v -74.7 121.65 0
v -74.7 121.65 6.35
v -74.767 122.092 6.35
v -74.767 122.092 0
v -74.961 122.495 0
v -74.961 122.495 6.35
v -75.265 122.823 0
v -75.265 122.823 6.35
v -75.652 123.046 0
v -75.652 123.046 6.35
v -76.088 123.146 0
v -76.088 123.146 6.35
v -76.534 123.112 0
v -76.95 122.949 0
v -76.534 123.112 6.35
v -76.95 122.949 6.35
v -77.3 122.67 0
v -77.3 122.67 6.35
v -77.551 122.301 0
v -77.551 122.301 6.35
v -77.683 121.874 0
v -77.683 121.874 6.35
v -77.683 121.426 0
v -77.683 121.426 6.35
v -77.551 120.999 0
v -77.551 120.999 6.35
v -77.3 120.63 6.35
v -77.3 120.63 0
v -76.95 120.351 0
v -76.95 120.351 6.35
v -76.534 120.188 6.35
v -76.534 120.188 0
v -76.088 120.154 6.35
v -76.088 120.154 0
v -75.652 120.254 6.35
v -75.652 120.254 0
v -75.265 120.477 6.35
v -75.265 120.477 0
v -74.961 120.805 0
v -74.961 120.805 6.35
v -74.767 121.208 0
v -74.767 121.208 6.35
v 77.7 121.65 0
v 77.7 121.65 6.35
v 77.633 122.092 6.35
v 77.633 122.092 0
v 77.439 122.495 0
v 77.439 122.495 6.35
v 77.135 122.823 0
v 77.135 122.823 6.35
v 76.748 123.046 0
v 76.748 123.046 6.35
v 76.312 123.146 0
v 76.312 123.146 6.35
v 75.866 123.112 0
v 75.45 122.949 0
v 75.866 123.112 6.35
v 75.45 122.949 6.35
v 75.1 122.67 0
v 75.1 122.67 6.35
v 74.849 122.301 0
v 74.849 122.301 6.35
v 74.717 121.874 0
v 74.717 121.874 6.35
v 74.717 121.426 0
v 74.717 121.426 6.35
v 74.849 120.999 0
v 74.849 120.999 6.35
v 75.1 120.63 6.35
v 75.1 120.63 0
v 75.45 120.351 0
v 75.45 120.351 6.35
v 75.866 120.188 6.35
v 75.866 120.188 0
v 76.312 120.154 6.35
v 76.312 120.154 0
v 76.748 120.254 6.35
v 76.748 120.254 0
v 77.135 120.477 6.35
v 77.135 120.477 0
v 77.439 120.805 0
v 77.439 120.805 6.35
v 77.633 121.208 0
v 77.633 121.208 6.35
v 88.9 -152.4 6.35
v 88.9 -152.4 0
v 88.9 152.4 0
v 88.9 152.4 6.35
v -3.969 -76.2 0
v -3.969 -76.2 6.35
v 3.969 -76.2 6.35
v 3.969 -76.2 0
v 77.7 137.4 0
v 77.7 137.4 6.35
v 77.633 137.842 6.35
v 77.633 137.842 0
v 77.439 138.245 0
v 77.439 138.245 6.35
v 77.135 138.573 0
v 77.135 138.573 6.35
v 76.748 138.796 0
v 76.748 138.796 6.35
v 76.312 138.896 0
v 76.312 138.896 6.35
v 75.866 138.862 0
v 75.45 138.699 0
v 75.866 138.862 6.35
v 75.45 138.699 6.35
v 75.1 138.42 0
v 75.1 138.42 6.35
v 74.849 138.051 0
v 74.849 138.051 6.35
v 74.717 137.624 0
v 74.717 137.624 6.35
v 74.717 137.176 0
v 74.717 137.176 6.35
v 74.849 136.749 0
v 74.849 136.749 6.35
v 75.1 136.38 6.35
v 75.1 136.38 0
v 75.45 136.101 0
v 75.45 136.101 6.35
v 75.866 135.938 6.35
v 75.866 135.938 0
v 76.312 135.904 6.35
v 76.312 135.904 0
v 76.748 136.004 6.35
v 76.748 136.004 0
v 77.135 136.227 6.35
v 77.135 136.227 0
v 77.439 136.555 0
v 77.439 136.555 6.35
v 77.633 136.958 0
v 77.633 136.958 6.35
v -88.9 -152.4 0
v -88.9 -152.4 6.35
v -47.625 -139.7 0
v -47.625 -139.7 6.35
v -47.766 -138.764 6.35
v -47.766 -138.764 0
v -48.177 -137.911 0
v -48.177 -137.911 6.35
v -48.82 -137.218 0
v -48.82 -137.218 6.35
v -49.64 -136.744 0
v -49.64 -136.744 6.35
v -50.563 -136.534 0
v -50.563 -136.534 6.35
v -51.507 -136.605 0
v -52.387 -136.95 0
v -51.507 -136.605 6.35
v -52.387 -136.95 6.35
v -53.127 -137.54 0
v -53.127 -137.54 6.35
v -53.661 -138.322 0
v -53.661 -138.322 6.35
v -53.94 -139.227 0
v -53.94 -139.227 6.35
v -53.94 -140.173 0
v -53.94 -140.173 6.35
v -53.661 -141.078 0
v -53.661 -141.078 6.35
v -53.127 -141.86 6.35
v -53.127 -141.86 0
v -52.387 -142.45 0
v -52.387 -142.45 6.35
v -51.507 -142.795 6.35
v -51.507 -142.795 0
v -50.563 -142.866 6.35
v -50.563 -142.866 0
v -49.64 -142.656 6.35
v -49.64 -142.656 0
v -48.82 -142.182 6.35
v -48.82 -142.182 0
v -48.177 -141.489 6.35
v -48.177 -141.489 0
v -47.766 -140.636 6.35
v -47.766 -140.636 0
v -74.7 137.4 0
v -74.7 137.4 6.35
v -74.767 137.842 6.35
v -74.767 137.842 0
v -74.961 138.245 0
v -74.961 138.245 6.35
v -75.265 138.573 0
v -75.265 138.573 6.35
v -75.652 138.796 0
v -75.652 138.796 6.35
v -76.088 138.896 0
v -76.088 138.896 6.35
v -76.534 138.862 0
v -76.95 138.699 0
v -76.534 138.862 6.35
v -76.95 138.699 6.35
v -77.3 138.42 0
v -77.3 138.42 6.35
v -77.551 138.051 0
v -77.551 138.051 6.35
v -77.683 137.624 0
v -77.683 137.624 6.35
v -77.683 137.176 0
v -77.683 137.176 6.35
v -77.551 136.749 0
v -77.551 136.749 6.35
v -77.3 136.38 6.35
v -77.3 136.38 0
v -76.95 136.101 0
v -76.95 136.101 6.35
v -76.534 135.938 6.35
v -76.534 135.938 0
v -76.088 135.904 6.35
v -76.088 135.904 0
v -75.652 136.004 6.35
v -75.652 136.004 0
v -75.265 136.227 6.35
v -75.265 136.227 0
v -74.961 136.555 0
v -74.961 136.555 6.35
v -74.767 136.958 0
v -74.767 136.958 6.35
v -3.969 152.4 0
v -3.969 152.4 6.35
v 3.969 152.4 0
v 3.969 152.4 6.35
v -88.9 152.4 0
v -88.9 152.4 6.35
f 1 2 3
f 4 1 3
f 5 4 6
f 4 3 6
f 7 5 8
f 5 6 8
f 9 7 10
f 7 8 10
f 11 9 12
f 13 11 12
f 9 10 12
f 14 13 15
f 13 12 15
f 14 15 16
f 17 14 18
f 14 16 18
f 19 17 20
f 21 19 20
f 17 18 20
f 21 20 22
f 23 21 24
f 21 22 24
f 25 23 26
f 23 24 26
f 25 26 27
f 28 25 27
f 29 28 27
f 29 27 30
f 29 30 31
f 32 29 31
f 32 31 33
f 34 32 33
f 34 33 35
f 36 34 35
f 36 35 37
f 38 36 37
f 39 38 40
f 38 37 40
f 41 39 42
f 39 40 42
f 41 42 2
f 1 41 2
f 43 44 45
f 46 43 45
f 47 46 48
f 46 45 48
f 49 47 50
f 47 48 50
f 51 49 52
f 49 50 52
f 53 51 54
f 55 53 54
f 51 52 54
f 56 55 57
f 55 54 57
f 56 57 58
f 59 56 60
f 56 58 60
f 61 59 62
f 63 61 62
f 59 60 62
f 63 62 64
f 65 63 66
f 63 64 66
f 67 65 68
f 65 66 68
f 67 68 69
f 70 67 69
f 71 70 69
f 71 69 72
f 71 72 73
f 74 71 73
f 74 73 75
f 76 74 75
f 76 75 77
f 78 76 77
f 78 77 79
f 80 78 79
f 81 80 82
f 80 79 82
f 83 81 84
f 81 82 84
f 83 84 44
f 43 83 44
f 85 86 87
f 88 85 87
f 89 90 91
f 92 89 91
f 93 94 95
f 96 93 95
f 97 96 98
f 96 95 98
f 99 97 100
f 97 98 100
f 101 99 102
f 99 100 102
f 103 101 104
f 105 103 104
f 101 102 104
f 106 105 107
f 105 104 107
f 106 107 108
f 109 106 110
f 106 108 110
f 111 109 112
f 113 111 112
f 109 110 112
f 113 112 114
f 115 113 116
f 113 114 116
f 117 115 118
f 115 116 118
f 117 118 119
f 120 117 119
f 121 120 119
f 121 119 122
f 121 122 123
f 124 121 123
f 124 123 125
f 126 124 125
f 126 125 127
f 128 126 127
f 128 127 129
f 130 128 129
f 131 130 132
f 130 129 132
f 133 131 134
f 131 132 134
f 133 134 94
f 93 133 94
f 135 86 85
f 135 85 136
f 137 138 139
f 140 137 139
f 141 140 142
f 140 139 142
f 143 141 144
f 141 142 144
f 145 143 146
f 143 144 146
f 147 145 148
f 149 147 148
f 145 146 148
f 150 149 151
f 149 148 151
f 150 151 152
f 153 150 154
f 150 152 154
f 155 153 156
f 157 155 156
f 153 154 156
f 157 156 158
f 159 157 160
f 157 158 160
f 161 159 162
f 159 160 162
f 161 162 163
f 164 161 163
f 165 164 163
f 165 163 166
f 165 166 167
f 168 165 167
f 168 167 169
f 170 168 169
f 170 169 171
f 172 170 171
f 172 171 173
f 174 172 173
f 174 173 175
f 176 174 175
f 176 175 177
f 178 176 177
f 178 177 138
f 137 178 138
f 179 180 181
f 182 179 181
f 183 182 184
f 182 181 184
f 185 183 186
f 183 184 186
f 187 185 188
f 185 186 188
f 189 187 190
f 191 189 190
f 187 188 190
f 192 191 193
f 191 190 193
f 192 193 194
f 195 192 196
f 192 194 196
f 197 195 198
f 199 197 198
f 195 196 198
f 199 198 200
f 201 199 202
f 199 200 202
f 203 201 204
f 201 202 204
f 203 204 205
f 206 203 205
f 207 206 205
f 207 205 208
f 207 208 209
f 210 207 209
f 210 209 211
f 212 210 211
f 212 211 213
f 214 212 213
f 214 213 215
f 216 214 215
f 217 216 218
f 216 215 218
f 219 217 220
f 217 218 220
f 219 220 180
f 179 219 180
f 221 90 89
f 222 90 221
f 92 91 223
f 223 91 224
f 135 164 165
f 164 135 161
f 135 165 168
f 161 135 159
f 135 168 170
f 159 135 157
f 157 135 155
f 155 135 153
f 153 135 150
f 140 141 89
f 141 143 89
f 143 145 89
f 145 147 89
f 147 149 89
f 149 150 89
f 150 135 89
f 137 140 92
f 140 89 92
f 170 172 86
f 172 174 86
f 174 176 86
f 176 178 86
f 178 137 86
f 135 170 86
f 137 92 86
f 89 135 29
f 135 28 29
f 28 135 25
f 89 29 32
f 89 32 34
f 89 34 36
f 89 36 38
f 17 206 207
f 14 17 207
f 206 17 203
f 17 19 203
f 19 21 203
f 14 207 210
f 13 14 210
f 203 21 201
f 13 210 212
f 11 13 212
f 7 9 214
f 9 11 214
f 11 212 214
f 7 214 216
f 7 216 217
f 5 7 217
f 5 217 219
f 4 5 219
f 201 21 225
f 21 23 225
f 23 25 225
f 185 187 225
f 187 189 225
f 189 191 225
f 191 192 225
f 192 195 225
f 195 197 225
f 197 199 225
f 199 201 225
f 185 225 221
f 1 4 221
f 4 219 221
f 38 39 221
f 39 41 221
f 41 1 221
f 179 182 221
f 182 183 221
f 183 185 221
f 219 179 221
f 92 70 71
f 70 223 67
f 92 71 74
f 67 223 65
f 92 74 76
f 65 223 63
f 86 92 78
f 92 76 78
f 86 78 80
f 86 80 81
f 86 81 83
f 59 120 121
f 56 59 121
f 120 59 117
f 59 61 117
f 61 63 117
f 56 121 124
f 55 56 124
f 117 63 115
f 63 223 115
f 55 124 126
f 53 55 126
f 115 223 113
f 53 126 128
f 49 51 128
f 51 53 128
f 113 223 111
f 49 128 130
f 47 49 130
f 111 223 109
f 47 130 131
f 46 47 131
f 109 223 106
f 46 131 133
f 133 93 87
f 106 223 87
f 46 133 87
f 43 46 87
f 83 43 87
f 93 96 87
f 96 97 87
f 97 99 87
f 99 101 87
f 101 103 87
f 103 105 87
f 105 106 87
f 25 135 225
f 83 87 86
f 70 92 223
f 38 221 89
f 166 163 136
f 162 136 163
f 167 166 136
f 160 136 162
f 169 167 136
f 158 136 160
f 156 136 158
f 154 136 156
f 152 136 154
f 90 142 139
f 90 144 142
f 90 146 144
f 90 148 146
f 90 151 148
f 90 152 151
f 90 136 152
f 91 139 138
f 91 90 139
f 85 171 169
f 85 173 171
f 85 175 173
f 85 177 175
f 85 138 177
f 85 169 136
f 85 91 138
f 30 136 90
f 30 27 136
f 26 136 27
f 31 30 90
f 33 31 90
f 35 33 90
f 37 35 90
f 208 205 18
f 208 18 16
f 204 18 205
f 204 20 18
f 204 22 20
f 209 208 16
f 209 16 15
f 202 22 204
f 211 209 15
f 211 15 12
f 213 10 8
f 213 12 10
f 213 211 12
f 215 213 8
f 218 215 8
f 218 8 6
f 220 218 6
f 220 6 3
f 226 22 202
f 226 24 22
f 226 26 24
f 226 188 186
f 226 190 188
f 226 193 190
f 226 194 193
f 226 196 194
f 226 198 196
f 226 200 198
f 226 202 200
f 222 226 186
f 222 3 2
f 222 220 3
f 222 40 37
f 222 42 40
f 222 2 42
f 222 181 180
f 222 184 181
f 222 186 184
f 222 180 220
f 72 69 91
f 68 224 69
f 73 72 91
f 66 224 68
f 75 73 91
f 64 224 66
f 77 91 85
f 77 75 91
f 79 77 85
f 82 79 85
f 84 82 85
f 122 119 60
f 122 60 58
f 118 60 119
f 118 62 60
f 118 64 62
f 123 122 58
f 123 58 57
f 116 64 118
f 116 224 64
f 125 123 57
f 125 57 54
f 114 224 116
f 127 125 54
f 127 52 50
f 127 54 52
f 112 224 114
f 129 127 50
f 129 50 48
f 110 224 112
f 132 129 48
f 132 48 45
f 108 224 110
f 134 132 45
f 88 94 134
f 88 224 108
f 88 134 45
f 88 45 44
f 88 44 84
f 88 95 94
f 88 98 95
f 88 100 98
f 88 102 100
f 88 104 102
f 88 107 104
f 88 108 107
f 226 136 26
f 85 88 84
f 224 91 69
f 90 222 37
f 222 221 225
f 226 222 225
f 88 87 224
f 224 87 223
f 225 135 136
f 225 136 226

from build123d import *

# Parameters (mm, degrees)
SKETCH2_W           = 6.35
SKETCH2_H           = 44.45
SKETCH2_W_2         = 20.864285714
SKETCH2_H_2         = 6.35
SKETCH2_W_3         = 27.214285714
BOSS_EXTRUDE1_DEPTH = 6.35
SKETCH3_W           = 7.9375
SKETCH3_H           = 228.6
CUT_EXTRUDE1_DEPTH  = 186.241592252
SKETCH4_R           = 3.175
CUT_EXTRUDE2_DEPTH  = 186.241592252
SKETCH5_R           = 1.5
CUT_EXTRUDE3_DEPTH  = 6.35
SKETCH6_W           = 6.35
SKETCH6_H           = 44.45
BOSS_EXTRUDE2_DEPTH = 6.35
SKETCH7_W           = 27.214285714
SKETCH7_H           = 6.35
CUT_EXTRUDE4_DEPTH  = 6.35
SKETCH9_W           = 6.35
SKETCH9_H           = 222.25
SKETCH9_W_2         = 20.864285714
SKETCH9_H_2         = 6.35
CUT_EXTRUDE5_DEPTH  = 6.35


with BuildPart() as part:
    # Sketch2 → Boss-Extrude1 (new body)
    with BuildSketch(Plane.XY):
        Polygon((0, -152.4), (0, 152.4), (-88.9, 152.4), (-88.9, 107.95), (-88.9, 63.5), (-88.9, 19.05), (-88.9, -25.4), (-88.9, -69.85), (-88.9, -114.3), (-88.9, -152.4), (-68.035714286, -152.4), (-40.821428571, -152.4), (-13.607142857, -152.4), align=None)
        Polygon((88.9, 152.4), (0, 152.4), (0, -152.4), (13.607142857, -152.4), (40.821428571, -152.4), (68.035714286, -152.4), (88.9, -152.4), (88.9, -114.3), (88.9, -69.85), (88.9, -25.4), (88.9, 19.05), (88.9, 63.5), (88.9, 107.95), align=None)
        with Locations((-92.075, 85.725)):
            Rectangle(SKETCH2_W, SKETCH2_H)
        with Locations((-92.075, -3.175)):
            Rectangle(SKETCH2_W, SKETCH2_H)
        with Locations((-92.075, -92.075)):
            Rectangle(SKETCH2_W, SKETCH2_H)
        with Locations((-78.467857143, -155.575)):
            Rectangle(SKETCH2_W_2, SKETCH2_H_2)
        with Locations((-27.214285714, -155.575)):
            Rectangle(SKETCH2_W_3, SKETCH2_H_2)
        with Locations((27.214285714, -155.575)):
            Rectangle(SKETCH2_W_3, SKETCH2_H_2)
        with Locations((92.075, -92.075)):
            Rectangle(SKETCH2_W, SKETCH2_H)
        with Locations((92.075, -3.175)):
            Rectangle(SKETCH2_W, SKETCH2_H)
        with Locations((92.075, 85.725)):
            Rectangle(SKETCH2_W, SKETCH2_H)
        with Locations((78.467857143, -155.575)):
            Rectangle(SKETCH2_W_2, SKETCH2_H_2)
    extrude(amount=BOSS_EXTRUDE1_DEPTH)

    # Sketch3 → Cut-Extrude1 (cut, through all)
    with BuildSketch(Plane.XY.offset(6.35)):
        with Locations((0, 38.1)):
            Rectangle(SKETCH3_W, SKETCH3_H)
    extrude(amount=-CUT_EXTRUDE1_DEPTH, mode=Mode.SUBTRACT)

    # Sketch4 → Cut-Extrude2 (cut, through all)
    with BuildSketch(Plane.XY.offset(6.35)):
        with Locations((-50.8, -139.7)):
            Circle(SKETCH4_R)
    extrude(amount=-CUT_EXTRUDE2_DEPTH, mode=Mode.SUBTRACT)

    # Sketch5 → Cut-Extrude3 (cut)
    with BuildSketch(Plane.XY.offset(6.35)):
        with Locations((-76.2, 137.4)):
            Circle(SKETCH5_R)
        with Locations((-76.2, 121.65)):
            Circle(SKETCH5_R)
        with Locations((76.2, 121.65)):
            Circle(SKETCH5_R)
        with Locations((76.2, 137.4)):
            Circle(SKETCH5_R)
    extrude(amount=-CUT_EXTRUDE3_DEPTH, mode=Mode.SUBTRACT)

    # Sketch6 → Boss-Extrude2 (add)
    with BuildSketch(Plane.XY.offset(6.35)):
        with Locations((-92.075, 41.275)):
            Rectangle(SKETCH6_W, SKETCH6_H)
        with Locations((-92.075, -47.625)):
            Rectangle(SKETCH6_W, SKETCH6_H)
        with Locations((92.075, 41.275)):
            Rectangle(SKETCH6_W, SKETCH6_H)
        with Locations((92.075, -47.625)):
            Rectangle(SKETCH6_W, SKETCH6_H)
    extrude(amount=-BOSS_EXTRUDE2_DEPTH)

    # Sketch7 → Cut-Extrude4 (cut)
    with BuildSketch(Plane.XY.offset(6.35)):
        with Locations((-27.214285714, -155.575)):
            Rectangle(SKETCH7_W, SKETCH7_H)
        with Locations((27.214285714, -155.575)):
            Rectangle(SKETCH7_W, SKETCH7_H)
    extrude(amount=-CUT_EXTRUDE4_DEPTH, mode=Mode.SUBTRACT)

    # Sketch9 → Cut-Extrude5 (cut)
    with BuildSketch(Plane(origin=(0, 0, 0), x_dir=(-1, 0, 0), z_dir=(0, 0, -1))):
        with Locations((-92.075, -3.175)):
            Rectangle(SKETCH9_W, SKETCH9_H)
        with Locations((92.075, -3.175)):
            Rectangle(SKETCH9_W, SKETCH9_H)
        with Locations((-78.467857143, -155.575)):
            Rectangle(SKETCH9_W_2, SKETCH9_H_2)
        with Locations((78.467857143, -155.575)):
            Rectangle(SKETCH9_W_2, SKETCH9_H_2)
    extrude(amount=-CUT_EXTRUDE5_DEPTH, mode=Mode.SUBTRACT)


solid = part.part
